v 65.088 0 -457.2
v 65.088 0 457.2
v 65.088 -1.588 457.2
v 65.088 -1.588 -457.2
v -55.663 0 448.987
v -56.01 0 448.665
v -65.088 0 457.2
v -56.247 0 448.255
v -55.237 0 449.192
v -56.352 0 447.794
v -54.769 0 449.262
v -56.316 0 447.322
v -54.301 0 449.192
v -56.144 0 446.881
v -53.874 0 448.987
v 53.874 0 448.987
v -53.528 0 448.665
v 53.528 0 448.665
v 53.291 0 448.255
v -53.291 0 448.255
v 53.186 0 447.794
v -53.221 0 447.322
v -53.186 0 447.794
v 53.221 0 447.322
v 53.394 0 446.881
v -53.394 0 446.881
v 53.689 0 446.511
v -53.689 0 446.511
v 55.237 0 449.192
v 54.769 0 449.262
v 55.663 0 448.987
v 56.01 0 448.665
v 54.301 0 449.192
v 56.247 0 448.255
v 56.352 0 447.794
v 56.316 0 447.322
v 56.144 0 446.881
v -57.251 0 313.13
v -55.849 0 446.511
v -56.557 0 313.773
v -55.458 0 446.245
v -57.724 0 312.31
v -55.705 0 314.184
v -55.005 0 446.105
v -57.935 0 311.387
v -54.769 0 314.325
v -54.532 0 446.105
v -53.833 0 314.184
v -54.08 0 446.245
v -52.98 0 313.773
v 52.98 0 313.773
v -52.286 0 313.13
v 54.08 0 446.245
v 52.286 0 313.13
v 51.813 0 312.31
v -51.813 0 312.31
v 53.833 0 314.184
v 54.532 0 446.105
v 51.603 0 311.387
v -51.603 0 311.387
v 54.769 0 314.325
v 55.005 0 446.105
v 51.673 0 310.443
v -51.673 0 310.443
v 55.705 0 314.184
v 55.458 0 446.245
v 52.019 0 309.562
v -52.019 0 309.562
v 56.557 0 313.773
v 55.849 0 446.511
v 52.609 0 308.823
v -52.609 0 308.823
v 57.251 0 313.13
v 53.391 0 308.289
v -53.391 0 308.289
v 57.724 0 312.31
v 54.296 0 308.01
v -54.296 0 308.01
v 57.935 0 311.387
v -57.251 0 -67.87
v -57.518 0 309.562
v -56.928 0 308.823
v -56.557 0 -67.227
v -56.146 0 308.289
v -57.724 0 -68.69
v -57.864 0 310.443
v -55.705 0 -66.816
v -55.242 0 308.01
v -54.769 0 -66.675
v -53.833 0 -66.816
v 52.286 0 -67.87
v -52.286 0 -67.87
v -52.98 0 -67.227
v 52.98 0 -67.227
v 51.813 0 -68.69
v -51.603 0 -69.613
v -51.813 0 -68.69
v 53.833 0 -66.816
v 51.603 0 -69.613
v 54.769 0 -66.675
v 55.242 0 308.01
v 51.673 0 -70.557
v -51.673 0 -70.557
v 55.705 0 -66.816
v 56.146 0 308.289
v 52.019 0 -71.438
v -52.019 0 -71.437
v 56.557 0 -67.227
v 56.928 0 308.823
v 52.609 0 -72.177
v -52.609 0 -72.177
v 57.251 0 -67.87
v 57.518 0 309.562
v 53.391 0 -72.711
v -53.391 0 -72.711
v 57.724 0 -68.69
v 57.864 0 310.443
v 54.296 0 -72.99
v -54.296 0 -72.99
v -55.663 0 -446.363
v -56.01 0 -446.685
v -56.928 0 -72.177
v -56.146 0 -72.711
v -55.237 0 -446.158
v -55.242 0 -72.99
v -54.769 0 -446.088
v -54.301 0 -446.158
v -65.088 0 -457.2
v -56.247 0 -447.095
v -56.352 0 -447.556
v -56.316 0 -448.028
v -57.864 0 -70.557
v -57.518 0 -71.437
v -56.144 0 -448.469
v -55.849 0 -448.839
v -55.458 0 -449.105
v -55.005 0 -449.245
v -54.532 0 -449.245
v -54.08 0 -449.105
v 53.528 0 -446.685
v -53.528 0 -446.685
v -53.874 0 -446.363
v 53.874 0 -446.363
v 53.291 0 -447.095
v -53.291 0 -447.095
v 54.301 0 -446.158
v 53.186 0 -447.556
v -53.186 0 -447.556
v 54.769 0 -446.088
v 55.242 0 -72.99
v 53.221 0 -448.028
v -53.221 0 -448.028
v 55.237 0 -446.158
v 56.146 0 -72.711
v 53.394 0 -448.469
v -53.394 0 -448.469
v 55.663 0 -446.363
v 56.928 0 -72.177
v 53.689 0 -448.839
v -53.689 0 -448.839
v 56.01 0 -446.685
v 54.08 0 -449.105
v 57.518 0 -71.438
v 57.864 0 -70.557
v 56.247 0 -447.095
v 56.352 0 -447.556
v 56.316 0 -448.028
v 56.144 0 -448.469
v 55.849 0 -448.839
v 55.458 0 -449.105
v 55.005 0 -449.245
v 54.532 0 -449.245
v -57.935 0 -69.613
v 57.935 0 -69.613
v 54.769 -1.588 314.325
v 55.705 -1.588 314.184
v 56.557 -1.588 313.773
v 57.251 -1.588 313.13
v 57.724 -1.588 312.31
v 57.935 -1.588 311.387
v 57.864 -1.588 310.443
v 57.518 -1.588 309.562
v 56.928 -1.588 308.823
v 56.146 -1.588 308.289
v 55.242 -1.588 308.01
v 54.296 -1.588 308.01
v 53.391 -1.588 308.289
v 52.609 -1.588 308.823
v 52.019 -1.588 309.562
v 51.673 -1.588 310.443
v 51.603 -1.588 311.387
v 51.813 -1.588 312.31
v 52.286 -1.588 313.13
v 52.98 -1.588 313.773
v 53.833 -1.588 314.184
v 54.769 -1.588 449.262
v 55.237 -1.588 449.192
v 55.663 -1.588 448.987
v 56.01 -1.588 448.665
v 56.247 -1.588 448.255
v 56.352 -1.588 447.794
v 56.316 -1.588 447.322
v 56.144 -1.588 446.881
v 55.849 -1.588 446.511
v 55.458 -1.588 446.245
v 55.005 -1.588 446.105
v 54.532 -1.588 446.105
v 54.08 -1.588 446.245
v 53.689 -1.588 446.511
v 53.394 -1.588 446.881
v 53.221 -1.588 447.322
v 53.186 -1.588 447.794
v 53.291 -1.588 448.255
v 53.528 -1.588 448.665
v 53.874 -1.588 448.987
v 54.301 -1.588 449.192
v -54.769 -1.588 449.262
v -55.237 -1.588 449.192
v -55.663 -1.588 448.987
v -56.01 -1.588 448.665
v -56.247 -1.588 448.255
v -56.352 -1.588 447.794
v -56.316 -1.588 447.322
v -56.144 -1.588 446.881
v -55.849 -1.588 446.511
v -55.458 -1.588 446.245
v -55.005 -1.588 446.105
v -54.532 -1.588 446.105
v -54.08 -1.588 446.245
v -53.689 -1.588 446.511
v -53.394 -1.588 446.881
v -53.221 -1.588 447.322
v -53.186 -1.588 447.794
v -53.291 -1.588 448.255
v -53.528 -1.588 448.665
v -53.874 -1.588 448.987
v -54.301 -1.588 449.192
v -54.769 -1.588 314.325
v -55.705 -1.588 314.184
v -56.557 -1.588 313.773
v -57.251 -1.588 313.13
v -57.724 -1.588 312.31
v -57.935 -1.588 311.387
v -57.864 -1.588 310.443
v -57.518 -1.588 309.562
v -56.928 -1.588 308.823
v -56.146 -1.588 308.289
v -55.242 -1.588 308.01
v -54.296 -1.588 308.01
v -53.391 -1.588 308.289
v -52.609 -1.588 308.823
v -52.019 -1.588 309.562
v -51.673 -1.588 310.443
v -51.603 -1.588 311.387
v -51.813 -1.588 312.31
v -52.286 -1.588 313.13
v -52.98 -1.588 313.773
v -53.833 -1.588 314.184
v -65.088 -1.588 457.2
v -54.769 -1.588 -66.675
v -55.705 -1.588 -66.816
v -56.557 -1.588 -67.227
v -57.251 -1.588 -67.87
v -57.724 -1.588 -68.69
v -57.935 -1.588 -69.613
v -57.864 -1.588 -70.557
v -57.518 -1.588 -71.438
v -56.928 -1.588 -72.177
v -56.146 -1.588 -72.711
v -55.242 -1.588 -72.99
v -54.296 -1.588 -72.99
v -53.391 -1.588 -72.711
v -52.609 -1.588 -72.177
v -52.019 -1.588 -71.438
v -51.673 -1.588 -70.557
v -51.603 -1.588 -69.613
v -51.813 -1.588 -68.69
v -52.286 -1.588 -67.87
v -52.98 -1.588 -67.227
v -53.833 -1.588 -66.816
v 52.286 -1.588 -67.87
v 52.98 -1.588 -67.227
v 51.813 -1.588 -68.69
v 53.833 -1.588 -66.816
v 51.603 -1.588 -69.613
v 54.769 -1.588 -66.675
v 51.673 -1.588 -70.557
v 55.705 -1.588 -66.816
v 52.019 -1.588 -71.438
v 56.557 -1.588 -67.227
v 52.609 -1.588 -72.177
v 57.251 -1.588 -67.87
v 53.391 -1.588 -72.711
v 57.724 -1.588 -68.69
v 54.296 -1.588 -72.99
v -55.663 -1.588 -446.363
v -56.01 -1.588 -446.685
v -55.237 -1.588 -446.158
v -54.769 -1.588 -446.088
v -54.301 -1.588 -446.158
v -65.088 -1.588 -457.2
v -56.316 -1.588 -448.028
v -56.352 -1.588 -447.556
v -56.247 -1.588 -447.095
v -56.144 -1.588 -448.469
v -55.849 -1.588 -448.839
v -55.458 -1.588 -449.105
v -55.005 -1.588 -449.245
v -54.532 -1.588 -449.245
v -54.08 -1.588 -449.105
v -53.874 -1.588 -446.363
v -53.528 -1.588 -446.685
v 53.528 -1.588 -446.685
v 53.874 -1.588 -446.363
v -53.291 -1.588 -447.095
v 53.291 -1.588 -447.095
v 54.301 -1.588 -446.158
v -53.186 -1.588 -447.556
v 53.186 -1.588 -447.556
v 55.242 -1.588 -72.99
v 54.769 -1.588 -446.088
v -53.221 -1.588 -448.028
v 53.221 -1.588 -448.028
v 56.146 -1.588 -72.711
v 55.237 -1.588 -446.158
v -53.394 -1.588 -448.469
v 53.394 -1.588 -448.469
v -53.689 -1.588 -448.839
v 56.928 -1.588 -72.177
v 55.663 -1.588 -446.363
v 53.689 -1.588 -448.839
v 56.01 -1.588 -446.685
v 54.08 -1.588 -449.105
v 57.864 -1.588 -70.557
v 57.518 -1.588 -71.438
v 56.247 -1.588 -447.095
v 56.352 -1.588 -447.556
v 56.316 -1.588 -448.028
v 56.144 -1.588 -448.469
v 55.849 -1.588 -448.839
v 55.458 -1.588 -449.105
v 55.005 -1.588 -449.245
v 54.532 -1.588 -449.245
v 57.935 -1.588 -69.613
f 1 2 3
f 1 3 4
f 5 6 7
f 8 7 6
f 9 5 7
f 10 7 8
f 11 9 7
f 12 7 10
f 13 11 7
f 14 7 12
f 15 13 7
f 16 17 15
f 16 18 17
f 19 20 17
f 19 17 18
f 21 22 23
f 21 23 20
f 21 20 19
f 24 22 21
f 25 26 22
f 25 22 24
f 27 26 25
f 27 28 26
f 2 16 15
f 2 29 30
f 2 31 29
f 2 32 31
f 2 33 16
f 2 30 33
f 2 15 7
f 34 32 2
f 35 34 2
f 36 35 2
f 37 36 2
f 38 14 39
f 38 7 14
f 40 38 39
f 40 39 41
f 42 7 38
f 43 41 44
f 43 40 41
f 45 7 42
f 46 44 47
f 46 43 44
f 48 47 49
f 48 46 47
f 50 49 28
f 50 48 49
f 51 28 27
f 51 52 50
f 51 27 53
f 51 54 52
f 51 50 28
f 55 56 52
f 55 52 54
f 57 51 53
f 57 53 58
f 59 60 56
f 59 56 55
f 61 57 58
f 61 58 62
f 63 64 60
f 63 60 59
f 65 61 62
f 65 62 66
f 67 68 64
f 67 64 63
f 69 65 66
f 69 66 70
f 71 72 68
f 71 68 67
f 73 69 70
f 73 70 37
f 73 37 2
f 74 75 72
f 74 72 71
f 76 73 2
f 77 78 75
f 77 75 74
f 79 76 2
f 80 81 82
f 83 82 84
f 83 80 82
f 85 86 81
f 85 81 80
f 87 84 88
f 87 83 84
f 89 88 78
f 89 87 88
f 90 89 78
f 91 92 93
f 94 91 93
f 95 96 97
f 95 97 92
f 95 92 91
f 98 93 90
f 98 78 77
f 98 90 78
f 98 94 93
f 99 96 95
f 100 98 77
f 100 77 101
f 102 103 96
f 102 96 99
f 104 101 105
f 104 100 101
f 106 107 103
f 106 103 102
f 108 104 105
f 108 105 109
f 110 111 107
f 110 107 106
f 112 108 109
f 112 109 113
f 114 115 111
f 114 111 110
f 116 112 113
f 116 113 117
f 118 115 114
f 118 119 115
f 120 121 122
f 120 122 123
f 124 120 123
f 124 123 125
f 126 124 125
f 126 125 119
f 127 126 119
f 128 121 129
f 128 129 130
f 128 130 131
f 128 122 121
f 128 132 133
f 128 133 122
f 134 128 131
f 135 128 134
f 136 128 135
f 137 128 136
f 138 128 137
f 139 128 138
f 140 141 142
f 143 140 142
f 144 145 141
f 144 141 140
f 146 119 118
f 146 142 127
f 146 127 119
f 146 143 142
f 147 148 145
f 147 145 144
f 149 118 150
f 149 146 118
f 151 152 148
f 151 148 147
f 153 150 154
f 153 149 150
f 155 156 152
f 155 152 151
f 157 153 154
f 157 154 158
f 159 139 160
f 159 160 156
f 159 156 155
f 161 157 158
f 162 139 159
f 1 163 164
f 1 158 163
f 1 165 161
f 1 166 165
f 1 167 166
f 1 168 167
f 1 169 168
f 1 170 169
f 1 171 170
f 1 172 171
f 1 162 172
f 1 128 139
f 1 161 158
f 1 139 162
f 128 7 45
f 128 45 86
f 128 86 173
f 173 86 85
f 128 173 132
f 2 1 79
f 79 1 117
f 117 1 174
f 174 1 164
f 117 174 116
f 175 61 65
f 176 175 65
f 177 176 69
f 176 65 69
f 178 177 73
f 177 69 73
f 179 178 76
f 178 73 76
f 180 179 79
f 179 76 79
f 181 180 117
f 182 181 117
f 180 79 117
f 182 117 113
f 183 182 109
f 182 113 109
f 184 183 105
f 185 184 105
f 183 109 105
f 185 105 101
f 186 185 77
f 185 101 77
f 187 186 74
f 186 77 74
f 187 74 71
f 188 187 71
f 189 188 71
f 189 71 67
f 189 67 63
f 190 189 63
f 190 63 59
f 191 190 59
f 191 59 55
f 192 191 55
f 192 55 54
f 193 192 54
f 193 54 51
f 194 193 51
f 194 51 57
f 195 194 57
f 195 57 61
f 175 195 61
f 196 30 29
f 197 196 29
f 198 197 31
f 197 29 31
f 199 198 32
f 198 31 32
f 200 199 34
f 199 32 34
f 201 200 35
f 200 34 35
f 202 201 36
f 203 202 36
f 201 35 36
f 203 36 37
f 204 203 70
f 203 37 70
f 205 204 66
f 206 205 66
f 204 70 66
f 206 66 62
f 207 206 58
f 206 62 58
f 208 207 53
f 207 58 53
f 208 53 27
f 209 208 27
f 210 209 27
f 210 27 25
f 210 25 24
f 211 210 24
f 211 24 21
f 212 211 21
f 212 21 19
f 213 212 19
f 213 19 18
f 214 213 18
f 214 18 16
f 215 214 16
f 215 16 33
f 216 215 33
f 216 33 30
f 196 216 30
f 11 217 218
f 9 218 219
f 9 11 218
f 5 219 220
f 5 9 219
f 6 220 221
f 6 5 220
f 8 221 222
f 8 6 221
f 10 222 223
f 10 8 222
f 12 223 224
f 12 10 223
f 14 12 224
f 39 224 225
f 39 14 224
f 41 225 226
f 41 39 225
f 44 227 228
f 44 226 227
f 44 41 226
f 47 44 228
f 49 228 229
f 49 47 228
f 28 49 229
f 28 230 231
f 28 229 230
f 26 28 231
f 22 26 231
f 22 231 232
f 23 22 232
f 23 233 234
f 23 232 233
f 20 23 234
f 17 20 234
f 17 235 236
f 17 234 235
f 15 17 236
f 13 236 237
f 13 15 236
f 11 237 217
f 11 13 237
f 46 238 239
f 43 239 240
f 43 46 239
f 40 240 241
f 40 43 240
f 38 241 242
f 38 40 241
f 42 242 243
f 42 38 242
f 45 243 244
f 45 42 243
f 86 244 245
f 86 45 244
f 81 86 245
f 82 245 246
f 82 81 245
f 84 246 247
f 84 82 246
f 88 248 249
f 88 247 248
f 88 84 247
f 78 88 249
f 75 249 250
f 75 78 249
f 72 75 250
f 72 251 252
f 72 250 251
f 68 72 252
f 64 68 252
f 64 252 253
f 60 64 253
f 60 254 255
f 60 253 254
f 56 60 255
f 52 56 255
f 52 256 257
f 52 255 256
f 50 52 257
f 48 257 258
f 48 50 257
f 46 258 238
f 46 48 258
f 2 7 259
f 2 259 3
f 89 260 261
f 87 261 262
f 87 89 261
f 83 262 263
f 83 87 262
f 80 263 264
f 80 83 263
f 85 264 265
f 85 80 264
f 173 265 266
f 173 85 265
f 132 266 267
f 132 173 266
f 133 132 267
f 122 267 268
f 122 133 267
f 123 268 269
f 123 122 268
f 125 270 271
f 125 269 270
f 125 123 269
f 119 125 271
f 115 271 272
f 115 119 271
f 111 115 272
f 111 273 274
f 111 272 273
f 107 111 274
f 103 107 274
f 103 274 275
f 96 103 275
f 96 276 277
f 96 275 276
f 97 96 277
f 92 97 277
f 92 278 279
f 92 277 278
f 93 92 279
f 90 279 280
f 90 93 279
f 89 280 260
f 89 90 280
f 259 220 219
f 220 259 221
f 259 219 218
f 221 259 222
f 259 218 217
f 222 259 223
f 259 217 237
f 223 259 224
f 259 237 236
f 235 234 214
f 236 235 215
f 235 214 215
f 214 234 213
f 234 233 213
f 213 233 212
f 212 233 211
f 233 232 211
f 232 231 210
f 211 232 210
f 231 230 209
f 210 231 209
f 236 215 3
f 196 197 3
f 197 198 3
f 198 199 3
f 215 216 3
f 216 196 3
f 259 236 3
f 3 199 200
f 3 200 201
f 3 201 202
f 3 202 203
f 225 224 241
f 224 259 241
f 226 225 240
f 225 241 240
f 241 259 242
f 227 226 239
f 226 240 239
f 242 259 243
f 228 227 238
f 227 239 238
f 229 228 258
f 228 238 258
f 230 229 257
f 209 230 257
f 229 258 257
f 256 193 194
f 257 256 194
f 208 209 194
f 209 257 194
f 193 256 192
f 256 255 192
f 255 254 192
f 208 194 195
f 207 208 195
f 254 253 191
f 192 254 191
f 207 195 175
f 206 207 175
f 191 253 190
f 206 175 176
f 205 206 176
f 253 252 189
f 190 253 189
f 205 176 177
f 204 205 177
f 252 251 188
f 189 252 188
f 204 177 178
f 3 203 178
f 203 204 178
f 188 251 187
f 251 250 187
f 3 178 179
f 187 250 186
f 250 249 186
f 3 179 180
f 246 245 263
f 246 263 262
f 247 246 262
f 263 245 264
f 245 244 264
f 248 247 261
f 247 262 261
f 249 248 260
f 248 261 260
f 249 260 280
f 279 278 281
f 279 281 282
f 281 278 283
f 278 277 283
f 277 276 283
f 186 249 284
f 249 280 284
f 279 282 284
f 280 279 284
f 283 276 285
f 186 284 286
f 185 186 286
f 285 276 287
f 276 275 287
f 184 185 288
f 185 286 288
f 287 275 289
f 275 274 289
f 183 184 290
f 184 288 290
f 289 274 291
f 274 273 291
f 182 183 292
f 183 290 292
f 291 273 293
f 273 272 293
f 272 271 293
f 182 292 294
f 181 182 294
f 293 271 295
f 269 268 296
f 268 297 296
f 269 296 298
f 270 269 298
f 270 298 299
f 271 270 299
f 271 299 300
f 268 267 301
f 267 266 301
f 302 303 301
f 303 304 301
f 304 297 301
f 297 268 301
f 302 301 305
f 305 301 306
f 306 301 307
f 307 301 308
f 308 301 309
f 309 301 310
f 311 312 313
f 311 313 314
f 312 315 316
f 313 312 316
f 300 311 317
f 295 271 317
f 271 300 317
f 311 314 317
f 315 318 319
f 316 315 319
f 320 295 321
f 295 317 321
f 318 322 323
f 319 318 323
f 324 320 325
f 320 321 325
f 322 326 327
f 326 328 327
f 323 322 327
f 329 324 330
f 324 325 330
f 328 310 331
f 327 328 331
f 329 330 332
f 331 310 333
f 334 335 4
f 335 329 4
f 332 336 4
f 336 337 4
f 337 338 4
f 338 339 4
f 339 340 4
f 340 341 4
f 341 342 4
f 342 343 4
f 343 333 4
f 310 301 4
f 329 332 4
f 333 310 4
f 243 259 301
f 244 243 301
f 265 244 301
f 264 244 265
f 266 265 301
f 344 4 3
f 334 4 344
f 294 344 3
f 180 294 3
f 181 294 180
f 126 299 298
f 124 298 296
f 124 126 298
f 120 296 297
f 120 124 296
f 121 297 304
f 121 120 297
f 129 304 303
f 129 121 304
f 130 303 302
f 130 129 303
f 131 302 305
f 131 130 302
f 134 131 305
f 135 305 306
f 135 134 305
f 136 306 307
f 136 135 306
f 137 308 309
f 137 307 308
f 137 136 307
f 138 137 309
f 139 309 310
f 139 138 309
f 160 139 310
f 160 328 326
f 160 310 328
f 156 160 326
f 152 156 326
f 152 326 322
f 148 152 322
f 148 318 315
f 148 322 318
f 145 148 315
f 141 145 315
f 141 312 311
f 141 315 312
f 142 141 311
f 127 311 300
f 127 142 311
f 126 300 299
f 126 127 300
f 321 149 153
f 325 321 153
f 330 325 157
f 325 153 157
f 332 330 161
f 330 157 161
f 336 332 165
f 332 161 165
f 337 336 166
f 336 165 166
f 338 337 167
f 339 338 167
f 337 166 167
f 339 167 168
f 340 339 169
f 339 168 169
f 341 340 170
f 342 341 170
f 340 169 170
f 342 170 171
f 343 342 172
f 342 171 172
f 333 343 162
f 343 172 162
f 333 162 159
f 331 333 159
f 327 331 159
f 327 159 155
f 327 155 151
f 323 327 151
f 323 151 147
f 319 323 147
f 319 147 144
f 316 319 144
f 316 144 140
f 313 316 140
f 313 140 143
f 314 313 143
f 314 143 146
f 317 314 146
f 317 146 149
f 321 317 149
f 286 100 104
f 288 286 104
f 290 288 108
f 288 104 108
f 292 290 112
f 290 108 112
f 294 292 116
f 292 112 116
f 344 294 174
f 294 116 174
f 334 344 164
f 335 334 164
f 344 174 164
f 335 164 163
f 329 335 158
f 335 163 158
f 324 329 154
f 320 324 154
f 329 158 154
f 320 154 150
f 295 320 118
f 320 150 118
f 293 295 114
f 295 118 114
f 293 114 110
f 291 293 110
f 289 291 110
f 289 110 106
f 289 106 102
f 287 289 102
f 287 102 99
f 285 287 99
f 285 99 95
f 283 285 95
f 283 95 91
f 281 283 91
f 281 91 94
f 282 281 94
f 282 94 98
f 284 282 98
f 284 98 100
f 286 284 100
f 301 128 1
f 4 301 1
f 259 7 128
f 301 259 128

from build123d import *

# Parameters (mm, degrees)
SKETCH1_W           = 130.175
SKETCH1_H           = 914.4
BOSS_EXTRUDE1_DEPTH = 1.5875
SKETCH2_R           = 1.5875
SKETCH2_R_2         = 3.175
CUT_EXTRUDE2_DEPTH  = 462.812454155


with BuildPart() as part:
    # Sketch1 → Boss-Extrude1 (new body)
    with BuildSketch(Plane(origin=(0, 0, 0), x_dir=(1, 0, 0), z_dir=(0, 1, 0))):
        Rectangle(SKETCH1_W, SKETCH1_H)
    extrude(amount=-BOSS_EXTRUDE1_DEPTH)

    # Sketch2 → Cut-Extrude2 (cut, through all)
    with BuildSketch(Plane(origin=(0, 0, 0), x_dir=(1, 0, 0), z_dir=(0, 1, 0))):
        with Locations(Location((54.76875, -447.675, 0), (0, 0, 270))):
            Circle(SKETCH2_R)
        with Locations(Location((54.76875, -311.15, 0), (0, 0, 270))):
            Circle(SKETCH2_R_2)
        with Locations(Location((54.76875, 447.675, 0), (0, 0, 270))):
            Circle(SKETCH2_R)
        with Locations(Location((54.76875, 69.85, 0), (0, 0, 270))):
            Circle(SKETCH2_R_2)
    cut_extrude2 = extrude(amount=-CUT_EXTRUDE2_DEPTH, mode=Mode.SUBTRACT)

    # Mirror2: Cut-Extrude2 across plane
    add(cut_extrude2.mirror(Plane(origin=(0, 0, 0), x_dir=(0, 0, 1), z_dir=(1, 0, 0))), mode=Mode.SUBTRACT)


solid = part.part
